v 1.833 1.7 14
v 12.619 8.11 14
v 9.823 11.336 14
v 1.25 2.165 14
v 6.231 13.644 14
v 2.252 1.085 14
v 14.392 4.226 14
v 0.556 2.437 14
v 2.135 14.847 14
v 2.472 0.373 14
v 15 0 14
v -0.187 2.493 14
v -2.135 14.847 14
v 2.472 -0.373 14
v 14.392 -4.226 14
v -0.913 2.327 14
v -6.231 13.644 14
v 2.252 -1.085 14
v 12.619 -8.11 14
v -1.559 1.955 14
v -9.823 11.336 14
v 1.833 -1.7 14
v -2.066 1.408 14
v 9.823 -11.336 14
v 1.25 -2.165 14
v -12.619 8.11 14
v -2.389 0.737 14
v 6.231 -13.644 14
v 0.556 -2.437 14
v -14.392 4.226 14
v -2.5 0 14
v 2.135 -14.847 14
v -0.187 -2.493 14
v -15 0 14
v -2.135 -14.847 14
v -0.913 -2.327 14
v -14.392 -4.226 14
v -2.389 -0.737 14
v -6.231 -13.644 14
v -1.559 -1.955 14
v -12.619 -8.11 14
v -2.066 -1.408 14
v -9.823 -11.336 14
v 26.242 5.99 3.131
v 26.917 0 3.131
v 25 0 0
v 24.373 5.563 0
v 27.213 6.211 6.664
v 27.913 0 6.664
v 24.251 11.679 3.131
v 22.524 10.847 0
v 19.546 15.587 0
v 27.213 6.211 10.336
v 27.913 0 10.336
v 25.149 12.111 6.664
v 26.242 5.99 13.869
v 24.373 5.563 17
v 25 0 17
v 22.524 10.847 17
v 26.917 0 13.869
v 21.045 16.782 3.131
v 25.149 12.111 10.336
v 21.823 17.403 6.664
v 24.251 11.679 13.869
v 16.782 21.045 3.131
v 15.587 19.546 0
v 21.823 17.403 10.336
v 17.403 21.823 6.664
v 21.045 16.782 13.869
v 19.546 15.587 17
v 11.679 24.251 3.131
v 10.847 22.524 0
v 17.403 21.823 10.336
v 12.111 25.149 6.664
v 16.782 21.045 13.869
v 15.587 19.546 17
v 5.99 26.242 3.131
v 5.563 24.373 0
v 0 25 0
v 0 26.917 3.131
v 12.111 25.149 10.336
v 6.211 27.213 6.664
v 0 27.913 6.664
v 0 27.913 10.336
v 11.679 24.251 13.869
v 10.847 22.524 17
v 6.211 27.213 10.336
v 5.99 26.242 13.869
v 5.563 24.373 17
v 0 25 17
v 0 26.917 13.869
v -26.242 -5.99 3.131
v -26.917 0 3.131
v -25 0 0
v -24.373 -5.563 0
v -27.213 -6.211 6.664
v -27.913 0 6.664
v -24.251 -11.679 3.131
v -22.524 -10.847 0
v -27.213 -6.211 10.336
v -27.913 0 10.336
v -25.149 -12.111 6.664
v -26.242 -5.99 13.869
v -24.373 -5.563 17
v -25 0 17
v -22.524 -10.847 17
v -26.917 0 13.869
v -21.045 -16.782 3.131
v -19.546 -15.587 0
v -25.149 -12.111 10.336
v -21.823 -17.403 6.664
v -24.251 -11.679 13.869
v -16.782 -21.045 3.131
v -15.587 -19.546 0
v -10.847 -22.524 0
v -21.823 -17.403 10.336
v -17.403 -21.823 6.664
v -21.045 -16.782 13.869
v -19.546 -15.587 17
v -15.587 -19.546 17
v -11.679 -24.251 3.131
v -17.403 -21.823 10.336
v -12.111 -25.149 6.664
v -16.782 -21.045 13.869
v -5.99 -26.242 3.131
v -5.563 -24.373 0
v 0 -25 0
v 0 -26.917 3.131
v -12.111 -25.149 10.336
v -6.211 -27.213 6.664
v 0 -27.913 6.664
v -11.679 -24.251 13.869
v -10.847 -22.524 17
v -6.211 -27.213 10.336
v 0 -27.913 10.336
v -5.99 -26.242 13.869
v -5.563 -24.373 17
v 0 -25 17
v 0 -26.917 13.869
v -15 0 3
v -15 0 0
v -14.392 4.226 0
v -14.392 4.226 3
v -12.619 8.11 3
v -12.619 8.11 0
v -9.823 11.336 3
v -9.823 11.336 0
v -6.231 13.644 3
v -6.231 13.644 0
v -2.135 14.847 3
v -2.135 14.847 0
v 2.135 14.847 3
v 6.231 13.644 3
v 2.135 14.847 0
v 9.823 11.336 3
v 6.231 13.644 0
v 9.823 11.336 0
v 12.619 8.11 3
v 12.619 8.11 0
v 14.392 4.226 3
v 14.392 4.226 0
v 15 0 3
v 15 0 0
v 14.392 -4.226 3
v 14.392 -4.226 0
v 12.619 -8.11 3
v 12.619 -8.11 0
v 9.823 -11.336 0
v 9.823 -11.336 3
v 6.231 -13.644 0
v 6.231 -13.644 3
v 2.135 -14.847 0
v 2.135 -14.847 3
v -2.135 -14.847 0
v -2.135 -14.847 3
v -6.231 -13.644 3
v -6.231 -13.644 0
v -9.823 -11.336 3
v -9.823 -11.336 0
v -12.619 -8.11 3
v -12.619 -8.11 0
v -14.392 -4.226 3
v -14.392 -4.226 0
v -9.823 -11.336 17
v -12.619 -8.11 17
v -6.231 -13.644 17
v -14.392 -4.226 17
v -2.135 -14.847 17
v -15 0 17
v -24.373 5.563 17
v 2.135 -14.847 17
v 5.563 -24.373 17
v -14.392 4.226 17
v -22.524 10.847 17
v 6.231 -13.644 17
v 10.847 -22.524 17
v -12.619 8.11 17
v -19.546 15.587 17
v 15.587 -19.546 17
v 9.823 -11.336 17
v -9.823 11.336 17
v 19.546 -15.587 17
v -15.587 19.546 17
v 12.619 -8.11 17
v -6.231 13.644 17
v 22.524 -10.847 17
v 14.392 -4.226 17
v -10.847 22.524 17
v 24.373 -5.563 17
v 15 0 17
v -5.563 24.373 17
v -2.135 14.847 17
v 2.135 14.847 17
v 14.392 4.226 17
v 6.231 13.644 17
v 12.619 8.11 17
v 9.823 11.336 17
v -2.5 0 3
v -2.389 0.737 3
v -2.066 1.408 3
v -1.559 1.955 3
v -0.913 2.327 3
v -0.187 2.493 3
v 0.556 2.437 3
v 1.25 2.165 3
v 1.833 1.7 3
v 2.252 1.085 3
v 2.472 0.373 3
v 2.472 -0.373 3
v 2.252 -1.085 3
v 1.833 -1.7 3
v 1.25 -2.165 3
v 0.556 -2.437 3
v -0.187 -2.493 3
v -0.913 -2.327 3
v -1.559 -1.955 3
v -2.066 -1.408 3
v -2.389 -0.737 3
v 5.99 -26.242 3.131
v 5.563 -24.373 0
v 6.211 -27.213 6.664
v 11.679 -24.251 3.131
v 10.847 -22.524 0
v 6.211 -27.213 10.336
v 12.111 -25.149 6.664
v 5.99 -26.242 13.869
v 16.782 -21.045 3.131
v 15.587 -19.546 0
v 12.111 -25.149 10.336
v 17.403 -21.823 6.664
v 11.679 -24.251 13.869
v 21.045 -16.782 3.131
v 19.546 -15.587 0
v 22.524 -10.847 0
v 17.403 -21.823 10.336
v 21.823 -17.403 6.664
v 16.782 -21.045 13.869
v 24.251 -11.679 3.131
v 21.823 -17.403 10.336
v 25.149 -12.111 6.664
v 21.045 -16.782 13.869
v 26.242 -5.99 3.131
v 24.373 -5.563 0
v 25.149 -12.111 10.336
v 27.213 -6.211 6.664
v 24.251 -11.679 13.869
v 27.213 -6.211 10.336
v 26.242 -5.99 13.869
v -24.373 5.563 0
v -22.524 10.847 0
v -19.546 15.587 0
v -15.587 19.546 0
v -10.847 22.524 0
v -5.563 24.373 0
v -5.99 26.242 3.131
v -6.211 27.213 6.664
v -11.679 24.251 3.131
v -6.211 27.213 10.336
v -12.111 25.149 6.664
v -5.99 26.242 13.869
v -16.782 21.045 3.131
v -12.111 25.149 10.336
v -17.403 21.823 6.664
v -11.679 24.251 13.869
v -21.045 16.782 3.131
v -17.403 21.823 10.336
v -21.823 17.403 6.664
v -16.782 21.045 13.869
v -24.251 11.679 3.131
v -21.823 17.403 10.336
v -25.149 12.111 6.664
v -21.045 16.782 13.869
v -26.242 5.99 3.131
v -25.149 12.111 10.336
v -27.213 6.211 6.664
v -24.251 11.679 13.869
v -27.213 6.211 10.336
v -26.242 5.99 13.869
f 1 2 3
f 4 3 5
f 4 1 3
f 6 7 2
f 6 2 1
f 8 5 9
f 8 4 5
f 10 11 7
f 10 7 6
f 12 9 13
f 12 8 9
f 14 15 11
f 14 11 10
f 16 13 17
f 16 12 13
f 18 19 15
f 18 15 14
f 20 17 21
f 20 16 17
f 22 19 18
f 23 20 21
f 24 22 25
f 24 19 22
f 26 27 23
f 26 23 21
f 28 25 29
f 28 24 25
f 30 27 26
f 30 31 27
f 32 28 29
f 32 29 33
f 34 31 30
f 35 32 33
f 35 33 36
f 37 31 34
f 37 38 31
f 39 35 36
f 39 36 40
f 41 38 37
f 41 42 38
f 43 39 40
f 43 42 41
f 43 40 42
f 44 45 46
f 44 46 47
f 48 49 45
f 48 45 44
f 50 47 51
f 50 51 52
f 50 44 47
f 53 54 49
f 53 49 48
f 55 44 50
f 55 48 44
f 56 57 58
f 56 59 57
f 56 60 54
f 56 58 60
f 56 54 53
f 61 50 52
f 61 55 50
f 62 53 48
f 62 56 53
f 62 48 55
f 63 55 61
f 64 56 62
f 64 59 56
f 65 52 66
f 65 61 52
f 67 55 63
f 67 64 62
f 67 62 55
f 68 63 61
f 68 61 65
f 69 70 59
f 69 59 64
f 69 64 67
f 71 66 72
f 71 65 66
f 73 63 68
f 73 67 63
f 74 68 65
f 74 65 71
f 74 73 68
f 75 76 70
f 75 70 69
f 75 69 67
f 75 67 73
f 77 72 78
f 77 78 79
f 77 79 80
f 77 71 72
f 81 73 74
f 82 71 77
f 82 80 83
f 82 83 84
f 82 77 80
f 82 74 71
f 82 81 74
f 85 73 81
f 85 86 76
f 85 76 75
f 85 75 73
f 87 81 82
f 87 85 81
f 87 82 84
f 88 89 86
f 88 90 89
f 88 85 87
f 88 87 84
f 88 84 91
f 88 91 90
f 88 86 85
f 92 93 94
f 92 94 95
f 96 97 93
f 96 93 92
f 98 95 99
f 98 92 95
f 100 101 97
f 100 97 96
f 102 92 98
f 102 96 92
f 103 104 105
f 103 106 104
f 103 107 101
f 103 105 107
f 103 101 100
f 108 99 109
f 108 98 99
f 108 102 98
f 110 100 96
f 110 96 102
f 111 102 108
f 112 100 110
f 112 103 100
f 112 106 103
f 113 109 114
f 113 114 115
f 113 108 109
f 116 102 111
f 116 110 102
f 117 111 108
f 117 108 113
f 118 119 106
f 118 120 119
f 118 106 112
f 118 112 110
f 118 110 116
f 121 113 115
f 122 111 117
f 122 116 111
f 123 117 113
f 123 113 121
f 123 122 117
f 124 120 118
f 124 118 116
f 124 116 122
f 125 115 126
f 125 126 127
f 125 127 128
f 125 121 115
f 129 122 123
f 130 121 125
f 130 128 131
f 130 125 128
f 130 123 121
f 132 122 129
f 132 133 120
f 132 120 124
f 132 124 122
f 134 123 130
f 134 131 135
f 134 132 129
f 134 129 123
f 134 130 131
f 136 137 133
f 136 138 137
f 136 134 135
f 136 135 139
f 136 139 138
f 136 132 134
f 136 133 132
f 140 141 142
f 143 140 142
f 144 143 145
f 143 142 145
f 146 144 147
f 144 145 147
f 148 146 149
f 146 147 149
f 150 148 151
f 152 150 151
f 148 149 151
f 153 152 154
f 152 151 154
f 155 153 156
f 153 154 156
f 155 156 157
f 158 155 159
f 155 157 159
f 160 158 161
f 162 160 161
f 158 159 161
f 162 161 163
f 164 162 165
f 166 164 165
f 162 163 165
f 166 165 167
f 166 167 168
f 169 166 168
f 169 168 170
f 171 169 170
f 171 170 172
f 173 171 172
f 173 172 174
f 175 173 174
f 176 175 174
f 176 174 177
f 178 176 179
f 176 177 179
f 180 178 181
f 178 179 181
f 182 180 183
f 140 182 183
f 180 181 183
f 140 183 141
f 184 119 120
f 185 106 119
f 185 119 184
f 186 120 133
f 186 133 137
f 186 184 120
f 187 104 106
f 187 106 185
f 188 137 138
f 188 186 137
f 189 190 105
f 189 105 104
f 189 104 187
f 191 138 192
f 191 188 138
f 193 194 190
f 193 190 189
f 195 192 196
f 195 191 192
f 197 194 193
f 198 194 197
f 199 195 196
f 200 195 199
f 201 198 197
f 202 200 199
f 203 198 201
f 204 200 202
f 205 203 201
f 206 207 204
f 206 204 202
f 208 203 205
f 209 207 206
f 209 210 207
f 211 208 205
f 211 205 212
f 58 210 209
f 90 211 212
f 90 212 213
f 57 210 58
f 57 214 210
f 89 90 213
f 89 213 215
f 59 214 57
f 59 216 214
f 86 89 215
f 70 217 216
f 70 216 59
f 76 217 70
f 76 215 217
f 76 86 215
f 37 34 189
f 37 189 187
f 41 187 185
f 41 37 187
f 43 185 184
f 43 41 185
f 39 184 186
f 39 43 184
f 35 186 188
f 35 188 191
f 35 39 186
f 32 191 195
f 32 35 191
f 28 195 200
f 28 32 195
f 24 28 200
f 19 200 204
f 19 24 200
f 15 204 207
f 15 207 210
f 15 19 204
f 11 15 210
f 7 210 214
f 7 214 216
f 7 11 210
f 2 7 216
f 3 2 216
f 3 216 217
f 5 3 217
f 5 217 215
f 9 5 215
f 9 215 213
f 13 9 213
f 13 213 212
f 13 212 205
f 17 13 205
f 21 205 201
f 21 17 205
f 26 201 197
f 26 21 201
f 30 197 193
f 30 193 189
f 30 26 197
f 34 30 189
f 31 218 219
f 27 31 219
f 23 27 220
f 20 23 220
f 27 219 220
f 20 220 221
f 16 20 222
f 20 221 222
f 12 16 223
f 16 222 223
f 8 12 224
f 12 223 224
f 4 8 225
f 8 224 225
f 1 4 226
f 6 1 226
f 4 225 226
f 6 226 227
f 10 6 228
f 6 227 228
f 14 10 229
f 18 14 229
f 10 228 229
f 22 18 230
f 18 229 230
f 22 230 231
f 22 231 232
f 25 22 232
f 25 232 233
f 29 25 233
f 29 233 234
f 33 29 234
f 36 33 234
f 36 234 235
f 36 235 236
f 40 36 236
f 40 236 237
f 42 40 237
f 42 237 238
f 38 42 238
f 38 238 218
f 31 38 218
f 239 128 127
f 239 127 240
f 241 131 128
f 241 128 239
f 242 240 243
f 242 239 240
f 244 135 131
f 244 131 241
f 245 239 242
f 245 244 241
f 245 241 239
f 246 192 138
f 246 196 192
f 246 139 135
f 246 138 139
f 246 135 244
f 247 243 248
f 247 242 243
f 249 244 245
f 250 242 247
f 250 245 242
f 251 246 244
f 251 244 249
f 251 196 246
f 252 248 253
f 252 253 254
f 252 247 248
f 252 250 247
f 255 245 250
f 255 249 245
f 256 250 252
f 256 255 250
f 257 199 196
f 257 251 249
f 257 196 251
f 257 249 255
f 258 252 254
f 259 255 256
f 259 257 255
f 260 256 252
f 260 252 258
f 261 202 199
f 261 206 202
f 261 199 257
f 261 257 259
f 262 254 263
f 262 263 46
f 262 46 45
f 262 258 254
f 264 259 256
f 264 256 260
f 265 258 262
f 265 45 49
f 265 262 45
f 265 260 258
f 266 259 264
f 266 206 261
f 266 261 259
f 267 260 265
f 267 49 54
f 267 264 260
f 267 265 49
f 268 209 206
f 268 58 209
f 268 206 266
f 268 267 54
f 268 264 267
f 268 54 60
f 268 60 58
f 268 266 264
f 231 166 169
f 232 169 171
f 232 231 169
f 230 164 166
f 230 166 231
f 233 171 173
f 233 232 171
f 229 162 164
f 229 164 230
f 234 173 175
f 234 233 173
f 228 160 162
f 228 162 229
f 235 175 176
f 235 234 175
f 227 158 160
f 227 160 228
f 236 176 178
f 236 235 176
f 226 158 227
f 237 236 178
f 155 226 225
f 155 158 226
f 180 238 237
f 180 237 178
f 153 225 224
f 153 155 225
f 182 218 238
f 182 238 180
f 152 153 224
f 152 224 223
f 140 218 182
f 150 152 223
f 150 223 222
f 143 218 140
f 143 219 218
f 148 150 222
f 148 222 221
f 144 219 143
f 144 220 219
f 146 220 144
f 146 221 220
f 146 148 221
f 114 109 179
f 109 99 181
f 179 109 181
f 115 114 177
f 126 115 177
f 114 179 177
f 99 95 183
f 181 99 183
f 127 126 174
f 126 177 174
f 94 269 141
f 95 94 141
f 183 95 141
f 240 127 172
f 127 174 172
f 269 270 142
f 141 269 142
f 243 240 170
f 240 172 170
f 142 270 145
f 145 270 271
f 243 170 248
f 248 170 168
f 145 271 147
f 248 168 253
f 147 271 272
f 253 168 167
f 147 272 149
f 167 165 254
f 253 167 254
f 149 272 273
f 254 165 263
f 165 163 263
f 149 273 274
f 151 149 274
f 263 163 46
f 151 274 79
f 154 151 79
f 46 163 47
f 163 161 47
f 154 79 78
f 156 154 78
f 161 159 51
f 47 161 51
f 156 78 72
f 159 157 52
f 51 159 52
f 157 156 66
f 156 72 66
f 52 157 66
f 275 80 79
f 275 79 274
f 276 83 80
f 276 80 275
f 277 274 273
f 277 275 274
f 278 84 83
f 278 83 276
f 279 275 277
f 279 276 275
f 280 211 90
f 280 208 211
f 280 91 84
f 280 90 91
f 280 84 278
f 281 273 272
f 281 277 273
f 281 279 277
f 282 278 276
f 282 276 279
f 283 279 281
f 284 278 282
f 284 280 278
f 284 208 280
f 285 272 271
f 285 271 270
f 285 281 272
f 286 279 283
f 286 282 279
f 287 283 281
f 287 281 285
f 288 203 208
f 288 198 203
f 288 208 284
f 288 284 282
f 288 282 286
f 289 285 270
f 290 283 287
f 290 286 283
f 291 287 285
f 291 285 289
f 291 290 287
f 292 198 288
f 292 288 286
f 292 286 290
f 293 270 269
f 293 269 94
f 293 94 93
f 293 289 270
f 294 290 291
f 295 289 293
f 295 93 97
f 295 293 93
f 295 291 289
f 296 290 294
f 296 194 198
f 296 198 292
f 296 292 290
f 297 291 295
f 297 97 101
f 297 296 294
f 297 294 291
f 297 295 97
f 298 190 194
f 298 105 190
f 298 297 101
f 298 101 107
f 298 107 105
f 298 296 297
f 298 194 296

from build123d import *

# Parameters (mm, degrees)
SKETCH_1_R          = 25
EXTRUDE_1_DEPTH     = 17
SKETCH_4_R          = 15
CUT_EXTRUDE_1_DEPTH = 3
CUT_EXTRUDE_START   = -3
SKETCH_5_R          = 15
CUT_EXTRUDE_2_DEPTH = 3
CUT_EXTRUDE_3_REACH = 44.052
SKETCH_6_R          = 2.5


with BuildPart() as part:
    # 草图1 → 凸台-拉伸1 (new body)
    with BuildSketch(Plane.XY):
        Circle(SKETCH_1_R)
    extrude(amount=EXTRUDE_1_DEPTH)

    # 扫描1: sweep along a curve in space
    with BuildLine() as sweep_1_path:
        ThreePointArc((25, 0, 17), (17.67766953, 17.67766953, 17), (0, 25, 17))
        ThreePointArc((0, 25, 17), (-17.67766953, 17.67766953, 17), (-25, 0, 17))
        ThreePointArc((-25, 0, 17), (-17.67766953, -17.67766953, 17), (0, -25, 17))
        ThreePointArc((0, -25, 17), (17.67766953, -17.67766953, 17), (25, 0, 17))
    # 草图3 → 扫描1 (sweep)
    with BuildSketch(Plane(origin=(0, 0, 0), x_dir=(1, 0, 0), z_dir=(0, 1, 0))):
        with BuildLine():
            Line((25, -17), (25, 0))
            ThreePointArc((25, 0), (28.038998363, -8.5), (25, -17))
        make_face()
    sweep(path=sweep_1_path.line)

    # 草图4 → 切除-拉伸1 (cut)
    with BuildSketch(Plane(origin=(0, 0, 0), x_dir=(-1, 0, 0), z_dir=(0, 0, -1))):
        Circle(SKETCH_4_R)
    extrude(amount=-CUT_EXTRUDE_1_DEPTH, mode=Mode.SUBTRACT)

    # 草图5 → 切除-拉伸2 (cut)
    with BuildSketch(Plane.XY.offset(17).offset(CUT_EXTRUDE_START)):
        with Locations(Location((0, 0, 0), (0, 0, 180))):
            Circle(SKETCH_5_R)
    extrude(amount=CUT_EXTRUDE_2_DEPTH, mode=Mode.SUBTRACT)

    # 草图6 → 切除-拉伸3 (cut, up to next)
    with BuildSketch(Plane(origin=(0, 0, 3), x_dir=(-1, 0, 0), z_dir=(0, 0, -1)), mode=Mode.PRIVATE) as cut_extrude_3_sk1:
        Circle(SKETCH_6_R)
    cut_extrude_3_tool1 = extrude(cut_extrude_3_sk1.sketch, amount=-CUT_EXTRUDE_3_REACH, mode=Mode.PRIVATE) & part.part
    add(cut_extrude_3_tool1.solids().sort_by_distance((0, 0, 3))[0], mode=Mode.SUBTRACT)


solid = part.part
